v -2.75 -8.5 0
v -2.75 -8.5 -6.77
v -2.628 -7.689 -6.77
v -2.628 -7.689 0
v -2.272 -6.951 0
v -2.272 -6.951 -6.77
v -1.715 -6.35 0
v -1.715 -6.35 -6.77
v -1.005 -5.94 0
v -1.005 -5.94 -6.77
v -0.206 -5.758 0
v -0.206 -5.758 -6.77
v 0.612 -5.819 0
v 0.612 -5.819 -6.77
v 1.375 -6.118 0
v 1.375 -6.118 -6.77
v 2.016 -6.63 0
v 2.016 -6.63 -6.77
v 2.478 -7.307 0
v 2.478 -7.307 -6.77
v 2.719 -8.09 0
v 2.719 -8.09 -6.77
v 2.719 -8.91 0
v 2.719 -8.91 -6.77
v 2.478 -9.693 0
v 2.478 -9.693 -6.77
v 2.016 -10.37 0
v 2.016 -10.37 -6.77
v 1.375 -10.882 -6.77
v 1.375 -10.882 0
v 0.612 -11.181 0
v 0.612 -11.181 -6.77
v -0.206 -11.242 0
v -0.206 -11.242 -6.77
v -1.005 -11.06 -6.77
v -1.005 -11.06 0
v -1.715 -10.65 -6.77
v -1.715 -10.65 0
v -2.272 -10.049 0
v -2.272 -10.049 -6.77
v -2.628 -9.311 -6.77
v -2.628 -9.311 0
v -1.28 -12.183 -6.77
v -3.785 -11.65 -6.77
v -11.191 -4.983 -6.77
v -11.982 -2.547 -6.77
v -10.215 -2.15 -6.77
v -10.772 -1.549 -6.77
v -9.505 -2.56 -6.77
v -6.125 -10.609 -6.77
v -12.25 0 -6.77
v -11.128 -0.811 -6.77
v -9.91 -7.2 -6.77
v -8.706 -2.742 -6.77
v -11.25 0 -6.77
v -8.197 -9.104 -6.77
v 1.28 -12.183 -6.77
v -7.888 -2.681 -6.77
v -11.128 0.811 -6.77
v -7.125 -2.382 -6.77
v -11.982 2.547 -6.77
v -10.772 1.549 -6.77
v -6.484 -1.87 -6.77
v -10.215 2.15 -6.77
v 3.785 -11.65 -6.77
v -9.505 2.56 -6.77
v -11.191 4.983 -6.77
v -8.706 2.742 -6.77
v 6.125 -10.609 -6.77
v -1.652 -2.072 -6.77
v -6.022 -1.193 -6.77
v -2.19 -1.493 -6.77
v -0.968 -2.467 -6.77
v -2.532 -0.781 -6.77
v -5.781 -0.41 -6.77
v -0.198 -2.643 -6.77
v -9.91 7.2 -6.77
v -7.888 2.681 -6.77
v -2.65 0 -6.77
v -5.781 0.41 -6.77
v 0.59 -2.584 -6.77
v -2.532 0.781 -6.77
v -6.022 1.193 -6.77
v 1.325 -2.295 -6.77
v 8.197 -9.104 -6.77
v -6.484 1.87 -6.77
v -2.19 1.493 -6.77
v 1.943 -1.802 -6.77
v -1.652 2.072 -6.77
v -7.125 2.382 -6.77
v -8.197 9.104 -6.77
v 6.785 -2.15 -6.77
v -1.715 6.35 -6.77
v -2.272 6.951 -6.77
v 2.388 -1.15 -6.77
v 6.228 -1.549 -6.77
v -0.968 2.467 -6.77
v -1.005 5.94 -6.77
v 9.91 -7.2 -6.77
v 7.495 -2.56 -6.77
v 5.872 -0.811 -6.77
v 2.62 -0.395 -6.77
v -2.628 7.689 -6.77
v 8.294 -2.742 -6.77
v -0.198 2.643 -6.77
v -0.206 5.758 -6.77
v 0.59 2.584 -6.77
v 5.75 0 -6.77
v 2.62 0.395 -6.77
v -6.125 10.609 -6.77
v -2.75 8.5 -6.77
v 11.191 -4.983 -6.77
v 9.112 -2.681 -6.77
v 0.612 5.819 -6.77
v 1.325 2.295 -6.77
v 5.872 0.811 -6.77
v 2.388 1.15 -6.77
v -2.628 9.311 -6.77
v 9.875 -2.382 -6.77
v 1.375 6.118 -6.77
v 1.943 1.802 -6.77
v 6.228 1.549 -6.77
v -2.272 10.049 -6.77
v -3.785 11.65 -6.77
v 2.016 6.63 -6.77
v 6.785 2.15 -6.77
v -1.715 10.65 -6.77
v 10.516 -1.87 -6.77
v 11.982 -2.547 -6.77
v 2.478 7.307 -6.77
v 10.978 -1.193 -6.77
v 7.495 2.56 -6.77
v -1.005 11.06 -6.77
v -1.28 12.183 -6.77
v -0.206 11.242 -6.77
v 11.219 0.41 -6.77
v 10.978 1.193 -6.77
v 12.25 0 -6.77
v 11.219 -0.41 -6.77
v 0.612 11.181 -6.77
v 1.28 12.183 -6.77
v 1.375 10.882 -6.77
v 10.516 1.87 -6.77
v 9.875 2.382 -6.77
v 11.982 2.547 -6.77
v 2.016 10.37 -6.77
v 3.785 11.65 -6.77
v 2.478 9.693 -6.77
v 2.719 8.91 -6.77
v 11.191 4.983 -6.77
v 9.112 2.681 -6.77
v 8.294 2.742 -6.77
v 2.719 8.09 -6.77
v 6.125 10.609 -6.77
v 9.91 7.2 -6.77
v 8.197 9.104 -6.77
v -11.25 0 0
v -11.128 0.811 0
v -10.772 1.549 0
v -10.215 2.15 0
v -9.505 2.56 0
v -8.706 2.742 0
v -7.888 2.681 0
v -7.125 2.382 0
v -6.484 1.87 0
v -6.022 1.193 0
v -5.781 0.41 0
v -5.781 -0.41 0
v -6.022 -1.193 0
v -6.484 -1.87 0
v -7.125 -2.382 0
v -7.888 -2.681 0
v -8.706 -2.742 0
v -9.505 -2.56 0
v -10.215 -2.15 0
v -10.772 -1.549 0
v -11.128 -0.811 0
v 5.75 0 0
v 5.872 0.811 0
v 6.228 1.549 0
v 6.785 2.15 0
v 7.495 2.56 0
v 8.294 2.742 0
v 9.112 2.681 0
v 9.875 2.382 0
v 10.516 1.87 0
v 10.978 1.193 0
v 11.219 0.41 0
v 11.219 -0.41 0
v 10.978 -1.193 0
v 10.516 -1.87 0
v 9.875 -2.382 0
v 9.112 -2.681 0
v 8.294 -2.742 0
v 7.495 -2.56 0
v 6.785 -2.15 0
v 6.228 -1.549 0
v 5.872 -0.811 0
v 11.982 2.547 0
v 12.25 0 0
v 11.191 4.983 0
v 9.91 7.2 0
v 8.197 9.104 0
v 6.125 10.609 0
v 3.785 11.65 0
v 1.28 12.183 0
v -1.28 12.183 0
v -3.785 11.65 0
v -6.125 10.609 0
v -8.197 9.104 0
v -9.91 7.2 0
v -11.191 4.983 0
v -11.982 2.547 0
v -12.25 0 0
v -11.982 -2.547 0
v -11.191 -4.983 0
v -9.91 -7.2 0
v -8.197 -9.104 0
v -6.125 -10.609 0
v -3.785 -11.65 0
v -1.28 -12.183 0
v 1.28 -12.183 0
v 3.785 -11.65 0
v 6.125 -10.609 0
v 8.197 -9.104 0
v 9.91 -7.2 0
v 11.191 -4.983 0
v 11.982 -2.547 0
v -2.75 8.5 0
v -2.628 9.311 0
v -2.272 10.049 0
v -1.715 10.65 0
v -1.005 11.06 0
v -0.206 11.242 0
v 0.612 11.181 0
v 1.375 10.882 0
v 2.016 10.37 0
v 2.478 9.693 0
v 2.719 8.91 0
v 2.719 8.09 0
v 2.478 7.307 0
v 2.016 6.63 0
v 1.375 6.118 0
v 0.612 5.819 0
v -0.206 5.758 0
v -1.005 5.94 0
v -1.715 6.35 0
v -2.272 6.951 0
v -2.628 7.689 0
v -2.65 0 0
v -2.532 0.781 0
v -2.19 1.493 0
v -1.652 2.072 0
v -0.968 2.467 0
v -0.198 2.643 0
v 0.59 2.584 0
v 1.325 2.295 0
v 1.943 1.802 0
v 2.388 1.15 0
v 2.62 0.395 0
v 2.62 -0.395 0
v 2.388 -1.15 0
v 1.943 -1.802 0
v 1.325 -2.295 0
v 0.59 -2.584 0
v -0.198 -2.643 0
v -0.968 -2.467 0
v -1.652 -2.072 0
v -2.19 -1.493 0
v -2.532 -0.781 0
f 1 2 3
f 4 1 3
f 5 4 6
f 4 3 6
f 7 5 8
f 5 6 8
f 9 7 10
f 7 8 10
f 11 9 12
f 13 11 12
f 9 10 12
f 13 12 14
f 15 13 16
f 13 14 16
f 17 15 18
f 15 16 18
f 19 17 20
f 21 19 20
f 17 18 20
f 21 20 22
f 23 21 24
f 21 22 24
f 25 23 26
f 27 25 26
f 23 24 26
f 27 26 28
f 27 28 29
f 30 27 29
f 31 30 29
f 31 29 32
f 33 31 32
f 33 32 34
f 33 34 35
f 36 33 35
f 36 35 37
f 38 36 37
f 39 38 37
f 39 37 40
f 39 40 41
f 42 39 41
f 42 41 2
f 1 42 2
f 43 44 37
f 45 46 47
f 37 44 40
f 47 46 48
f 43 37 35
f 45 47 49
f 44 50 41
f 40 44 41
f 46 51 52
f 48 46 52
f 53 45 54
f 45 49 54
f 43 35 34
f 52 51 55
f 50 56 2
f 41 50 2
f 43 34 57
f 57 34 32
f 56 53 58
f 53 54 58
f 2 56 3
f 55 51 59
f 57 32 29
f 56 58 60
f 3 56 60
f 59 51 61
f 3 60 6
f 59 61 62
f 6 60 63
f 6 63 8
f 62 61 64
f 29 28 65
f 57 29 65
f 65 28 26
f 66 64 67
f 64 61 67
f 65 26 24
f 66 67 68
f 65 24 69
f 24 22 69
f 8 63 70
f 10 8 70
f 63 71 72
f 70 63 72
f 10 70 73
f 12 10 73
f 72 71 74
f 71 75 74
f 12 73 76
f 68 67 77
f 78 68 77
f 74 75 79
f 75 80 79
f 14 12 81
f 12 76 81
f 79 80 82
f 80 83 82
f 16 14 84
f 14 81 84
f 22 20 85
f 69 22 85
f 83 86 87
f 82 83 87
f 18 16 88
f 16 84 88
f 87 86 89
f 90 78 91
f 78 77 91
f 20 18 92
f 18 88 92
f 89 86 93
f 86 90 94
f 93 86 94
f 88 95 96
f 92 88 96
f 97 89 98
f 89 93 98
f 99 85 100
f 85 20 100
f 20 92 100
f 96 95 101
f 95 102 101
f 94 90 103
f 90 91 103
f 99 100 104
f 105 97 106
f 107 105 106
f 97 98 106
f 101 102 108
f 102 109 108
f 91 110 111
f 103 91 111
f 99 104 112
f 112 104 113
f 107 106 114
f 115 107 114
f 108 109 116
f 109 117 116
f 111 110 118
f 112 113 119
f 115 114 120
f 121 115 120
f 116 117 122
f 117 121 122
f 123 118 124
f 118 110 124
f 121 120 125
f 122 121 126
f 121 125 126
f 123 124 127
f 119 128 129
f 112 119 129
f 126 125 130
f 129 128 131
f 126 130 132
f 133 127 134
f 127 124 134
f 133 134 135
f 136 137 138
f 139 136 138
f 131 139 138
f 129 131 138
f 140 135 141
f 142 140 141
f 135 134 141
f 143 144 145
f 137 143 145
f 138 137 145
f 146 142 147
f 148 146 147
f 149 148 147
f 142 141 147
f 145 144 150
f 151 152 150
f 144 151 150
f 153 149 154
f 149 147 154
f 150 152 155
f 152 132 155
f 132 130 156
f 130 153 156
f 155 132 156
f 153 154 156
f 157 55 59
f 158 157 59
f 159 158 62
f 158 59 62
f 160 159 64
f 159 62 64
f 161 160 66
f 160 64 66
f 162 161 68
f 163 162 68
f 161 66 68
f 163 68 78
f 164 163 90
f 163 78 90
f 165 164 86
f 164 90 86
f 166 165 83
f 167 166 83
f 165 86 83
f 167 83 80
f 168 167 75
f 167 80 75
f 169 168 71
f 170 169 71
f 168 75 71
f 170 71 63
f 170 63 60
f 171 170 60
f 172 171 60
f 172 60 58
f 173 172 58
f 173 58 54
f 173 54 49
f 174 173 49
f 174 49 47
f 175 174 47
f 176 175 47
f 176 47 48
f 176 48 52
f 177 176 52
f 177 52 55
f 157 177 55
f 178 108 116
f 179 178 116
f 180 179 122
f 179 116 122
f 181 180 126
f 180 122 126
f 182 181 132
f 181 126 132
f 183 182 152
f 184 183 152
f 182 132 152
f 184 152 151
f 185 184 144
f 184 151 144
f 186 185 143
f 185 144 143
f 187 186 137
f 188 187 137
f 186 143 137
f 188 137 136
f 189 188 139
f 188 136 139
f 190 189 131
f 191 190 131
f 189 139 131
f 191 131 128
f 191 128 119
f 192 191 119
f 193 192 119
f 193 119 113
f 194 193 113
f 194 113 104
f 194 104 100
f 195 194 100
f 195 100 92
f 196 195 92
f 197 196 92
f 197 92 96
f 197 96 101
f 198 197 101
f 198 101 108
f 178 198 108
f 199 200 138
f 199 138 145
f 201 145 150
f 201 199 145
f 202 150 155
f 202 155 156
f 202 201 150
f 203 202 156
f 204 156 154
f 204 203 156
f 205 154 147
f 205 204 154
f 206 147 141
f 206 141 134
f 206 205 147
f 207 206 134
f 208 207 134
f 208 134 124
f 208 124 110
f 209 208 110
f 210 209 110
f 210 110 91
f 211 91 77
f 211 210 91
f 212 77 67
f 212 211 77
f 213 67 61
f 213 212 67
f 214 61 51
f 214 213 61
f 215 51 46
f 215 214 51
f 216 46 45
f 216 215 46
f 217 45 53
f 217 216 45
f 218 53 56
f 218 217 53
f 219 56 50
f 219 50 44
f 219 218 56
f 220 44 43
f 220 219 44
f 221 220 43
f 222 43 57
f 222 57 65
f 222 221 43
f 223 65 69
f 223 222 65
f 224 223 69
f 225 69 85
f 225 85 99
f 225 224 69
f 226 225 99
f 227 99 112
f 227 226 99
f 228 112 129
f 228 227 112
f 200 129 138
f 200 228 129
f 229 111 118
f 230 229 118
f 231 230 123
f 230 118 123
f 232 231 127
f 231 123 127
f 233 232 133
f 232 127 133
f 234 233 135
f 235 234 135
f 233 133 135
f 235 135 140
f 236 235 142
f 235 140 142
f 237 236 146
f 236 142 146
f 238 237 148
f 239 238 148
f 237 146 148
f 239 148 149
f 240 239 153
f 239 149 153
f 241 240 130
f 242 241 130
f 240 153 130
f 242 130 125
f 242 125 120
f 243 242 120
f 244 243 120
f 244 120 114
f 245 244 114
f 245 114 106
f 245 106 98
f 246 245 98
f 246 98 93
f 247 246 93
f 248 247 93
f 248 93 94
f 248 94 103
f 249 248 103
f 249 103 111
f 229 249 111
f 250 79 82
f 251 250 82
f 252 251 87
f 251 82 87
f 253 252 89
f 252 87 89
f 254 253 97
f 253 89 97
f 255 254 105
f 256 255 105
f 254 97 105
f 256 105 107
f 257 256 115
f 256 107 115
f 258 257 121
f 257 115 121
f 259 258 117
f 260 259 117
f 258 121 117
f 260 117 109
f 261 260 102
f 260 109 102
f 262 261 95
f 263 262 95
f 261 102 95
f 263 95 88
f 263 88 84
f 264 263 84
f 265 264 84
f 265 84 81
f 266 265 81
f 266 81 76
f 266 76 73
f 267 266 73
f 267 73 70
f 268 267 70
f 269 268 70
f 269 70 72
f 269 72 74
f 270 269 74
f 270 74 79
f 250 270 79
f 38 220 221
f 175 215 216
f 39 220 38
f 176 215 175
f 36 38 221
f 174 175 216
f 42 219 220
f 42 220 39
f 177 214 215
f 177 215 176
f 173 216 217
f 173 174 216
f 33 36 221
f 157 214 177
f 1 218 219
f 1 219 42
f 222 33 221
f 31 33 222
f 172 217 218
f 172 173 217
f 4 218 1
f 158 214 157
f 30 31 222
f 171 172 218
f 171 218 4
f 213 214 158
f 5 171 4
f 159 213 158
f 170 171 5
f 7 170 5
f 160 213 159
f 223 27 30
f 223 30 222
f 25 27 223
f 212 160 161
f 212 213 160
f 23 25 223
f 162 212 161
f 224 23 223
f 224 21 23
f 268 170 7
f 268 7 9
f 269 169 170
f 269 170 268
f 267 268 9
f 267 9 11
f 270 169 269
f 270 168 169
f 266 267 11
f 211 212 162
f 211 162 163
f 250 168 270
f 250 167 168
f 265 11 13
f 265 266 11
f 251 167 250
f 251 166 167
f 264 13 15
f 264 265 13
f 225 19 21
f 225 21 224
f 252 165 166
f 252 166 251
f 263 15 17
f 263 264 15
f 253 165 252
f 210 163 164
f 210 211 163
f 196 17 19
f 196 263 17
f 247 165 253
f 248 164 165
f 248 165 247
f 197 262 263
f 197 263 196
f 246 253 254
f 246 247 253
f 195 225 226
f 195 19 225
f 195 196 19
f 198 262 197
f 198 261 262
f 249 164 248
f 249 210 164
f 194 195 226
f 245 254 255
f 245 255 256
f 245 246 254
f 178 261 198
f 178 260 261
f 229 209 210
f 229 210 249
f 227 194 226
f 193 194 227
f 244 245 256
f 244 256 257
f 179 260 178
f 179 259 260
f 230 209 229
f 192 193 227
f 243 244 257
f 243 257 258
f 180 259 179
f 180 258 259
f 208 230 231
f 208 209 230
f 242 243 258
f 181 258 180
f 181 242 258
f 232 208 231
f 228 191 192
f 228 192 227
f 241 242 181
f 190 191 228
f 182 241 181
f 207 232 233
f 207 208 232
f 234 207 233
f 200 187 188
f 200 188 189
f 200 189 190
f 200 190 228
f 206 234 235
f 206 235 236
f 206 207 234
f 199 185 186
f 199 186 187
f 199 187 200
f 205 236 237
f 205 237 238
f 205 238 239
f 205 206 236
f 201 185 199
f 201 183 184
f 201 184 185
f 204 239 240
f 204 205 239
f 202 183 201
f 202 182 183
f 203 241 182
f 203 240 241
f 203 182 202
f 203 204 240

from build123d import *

# Parameters (mm, degrees)
F0_R     = 12.25
F1_DEPTH = 6.77
F2_D     = 5.5
F3_D     = 5.3


with BuildPart() as f1:
    # F0 (on Top) → F1 (new body)
    with BuildSketch(Plane.XY):
        Circle(F0_R)
    extrude(amount=-F1_DEPTH)

    # F2 (through all)
    with Locations(Plane.XY):
        with Locations((0, 8.5), (-8.5, 0), (0, -8.5), (8.5, 0)):
            Hole(F2_D / 2)

    # F3 (through all)
    with Locations(Plane.XY):
        with Locations((0, 0)):
            Hole(F3_D / 2)


solid = f1.part
